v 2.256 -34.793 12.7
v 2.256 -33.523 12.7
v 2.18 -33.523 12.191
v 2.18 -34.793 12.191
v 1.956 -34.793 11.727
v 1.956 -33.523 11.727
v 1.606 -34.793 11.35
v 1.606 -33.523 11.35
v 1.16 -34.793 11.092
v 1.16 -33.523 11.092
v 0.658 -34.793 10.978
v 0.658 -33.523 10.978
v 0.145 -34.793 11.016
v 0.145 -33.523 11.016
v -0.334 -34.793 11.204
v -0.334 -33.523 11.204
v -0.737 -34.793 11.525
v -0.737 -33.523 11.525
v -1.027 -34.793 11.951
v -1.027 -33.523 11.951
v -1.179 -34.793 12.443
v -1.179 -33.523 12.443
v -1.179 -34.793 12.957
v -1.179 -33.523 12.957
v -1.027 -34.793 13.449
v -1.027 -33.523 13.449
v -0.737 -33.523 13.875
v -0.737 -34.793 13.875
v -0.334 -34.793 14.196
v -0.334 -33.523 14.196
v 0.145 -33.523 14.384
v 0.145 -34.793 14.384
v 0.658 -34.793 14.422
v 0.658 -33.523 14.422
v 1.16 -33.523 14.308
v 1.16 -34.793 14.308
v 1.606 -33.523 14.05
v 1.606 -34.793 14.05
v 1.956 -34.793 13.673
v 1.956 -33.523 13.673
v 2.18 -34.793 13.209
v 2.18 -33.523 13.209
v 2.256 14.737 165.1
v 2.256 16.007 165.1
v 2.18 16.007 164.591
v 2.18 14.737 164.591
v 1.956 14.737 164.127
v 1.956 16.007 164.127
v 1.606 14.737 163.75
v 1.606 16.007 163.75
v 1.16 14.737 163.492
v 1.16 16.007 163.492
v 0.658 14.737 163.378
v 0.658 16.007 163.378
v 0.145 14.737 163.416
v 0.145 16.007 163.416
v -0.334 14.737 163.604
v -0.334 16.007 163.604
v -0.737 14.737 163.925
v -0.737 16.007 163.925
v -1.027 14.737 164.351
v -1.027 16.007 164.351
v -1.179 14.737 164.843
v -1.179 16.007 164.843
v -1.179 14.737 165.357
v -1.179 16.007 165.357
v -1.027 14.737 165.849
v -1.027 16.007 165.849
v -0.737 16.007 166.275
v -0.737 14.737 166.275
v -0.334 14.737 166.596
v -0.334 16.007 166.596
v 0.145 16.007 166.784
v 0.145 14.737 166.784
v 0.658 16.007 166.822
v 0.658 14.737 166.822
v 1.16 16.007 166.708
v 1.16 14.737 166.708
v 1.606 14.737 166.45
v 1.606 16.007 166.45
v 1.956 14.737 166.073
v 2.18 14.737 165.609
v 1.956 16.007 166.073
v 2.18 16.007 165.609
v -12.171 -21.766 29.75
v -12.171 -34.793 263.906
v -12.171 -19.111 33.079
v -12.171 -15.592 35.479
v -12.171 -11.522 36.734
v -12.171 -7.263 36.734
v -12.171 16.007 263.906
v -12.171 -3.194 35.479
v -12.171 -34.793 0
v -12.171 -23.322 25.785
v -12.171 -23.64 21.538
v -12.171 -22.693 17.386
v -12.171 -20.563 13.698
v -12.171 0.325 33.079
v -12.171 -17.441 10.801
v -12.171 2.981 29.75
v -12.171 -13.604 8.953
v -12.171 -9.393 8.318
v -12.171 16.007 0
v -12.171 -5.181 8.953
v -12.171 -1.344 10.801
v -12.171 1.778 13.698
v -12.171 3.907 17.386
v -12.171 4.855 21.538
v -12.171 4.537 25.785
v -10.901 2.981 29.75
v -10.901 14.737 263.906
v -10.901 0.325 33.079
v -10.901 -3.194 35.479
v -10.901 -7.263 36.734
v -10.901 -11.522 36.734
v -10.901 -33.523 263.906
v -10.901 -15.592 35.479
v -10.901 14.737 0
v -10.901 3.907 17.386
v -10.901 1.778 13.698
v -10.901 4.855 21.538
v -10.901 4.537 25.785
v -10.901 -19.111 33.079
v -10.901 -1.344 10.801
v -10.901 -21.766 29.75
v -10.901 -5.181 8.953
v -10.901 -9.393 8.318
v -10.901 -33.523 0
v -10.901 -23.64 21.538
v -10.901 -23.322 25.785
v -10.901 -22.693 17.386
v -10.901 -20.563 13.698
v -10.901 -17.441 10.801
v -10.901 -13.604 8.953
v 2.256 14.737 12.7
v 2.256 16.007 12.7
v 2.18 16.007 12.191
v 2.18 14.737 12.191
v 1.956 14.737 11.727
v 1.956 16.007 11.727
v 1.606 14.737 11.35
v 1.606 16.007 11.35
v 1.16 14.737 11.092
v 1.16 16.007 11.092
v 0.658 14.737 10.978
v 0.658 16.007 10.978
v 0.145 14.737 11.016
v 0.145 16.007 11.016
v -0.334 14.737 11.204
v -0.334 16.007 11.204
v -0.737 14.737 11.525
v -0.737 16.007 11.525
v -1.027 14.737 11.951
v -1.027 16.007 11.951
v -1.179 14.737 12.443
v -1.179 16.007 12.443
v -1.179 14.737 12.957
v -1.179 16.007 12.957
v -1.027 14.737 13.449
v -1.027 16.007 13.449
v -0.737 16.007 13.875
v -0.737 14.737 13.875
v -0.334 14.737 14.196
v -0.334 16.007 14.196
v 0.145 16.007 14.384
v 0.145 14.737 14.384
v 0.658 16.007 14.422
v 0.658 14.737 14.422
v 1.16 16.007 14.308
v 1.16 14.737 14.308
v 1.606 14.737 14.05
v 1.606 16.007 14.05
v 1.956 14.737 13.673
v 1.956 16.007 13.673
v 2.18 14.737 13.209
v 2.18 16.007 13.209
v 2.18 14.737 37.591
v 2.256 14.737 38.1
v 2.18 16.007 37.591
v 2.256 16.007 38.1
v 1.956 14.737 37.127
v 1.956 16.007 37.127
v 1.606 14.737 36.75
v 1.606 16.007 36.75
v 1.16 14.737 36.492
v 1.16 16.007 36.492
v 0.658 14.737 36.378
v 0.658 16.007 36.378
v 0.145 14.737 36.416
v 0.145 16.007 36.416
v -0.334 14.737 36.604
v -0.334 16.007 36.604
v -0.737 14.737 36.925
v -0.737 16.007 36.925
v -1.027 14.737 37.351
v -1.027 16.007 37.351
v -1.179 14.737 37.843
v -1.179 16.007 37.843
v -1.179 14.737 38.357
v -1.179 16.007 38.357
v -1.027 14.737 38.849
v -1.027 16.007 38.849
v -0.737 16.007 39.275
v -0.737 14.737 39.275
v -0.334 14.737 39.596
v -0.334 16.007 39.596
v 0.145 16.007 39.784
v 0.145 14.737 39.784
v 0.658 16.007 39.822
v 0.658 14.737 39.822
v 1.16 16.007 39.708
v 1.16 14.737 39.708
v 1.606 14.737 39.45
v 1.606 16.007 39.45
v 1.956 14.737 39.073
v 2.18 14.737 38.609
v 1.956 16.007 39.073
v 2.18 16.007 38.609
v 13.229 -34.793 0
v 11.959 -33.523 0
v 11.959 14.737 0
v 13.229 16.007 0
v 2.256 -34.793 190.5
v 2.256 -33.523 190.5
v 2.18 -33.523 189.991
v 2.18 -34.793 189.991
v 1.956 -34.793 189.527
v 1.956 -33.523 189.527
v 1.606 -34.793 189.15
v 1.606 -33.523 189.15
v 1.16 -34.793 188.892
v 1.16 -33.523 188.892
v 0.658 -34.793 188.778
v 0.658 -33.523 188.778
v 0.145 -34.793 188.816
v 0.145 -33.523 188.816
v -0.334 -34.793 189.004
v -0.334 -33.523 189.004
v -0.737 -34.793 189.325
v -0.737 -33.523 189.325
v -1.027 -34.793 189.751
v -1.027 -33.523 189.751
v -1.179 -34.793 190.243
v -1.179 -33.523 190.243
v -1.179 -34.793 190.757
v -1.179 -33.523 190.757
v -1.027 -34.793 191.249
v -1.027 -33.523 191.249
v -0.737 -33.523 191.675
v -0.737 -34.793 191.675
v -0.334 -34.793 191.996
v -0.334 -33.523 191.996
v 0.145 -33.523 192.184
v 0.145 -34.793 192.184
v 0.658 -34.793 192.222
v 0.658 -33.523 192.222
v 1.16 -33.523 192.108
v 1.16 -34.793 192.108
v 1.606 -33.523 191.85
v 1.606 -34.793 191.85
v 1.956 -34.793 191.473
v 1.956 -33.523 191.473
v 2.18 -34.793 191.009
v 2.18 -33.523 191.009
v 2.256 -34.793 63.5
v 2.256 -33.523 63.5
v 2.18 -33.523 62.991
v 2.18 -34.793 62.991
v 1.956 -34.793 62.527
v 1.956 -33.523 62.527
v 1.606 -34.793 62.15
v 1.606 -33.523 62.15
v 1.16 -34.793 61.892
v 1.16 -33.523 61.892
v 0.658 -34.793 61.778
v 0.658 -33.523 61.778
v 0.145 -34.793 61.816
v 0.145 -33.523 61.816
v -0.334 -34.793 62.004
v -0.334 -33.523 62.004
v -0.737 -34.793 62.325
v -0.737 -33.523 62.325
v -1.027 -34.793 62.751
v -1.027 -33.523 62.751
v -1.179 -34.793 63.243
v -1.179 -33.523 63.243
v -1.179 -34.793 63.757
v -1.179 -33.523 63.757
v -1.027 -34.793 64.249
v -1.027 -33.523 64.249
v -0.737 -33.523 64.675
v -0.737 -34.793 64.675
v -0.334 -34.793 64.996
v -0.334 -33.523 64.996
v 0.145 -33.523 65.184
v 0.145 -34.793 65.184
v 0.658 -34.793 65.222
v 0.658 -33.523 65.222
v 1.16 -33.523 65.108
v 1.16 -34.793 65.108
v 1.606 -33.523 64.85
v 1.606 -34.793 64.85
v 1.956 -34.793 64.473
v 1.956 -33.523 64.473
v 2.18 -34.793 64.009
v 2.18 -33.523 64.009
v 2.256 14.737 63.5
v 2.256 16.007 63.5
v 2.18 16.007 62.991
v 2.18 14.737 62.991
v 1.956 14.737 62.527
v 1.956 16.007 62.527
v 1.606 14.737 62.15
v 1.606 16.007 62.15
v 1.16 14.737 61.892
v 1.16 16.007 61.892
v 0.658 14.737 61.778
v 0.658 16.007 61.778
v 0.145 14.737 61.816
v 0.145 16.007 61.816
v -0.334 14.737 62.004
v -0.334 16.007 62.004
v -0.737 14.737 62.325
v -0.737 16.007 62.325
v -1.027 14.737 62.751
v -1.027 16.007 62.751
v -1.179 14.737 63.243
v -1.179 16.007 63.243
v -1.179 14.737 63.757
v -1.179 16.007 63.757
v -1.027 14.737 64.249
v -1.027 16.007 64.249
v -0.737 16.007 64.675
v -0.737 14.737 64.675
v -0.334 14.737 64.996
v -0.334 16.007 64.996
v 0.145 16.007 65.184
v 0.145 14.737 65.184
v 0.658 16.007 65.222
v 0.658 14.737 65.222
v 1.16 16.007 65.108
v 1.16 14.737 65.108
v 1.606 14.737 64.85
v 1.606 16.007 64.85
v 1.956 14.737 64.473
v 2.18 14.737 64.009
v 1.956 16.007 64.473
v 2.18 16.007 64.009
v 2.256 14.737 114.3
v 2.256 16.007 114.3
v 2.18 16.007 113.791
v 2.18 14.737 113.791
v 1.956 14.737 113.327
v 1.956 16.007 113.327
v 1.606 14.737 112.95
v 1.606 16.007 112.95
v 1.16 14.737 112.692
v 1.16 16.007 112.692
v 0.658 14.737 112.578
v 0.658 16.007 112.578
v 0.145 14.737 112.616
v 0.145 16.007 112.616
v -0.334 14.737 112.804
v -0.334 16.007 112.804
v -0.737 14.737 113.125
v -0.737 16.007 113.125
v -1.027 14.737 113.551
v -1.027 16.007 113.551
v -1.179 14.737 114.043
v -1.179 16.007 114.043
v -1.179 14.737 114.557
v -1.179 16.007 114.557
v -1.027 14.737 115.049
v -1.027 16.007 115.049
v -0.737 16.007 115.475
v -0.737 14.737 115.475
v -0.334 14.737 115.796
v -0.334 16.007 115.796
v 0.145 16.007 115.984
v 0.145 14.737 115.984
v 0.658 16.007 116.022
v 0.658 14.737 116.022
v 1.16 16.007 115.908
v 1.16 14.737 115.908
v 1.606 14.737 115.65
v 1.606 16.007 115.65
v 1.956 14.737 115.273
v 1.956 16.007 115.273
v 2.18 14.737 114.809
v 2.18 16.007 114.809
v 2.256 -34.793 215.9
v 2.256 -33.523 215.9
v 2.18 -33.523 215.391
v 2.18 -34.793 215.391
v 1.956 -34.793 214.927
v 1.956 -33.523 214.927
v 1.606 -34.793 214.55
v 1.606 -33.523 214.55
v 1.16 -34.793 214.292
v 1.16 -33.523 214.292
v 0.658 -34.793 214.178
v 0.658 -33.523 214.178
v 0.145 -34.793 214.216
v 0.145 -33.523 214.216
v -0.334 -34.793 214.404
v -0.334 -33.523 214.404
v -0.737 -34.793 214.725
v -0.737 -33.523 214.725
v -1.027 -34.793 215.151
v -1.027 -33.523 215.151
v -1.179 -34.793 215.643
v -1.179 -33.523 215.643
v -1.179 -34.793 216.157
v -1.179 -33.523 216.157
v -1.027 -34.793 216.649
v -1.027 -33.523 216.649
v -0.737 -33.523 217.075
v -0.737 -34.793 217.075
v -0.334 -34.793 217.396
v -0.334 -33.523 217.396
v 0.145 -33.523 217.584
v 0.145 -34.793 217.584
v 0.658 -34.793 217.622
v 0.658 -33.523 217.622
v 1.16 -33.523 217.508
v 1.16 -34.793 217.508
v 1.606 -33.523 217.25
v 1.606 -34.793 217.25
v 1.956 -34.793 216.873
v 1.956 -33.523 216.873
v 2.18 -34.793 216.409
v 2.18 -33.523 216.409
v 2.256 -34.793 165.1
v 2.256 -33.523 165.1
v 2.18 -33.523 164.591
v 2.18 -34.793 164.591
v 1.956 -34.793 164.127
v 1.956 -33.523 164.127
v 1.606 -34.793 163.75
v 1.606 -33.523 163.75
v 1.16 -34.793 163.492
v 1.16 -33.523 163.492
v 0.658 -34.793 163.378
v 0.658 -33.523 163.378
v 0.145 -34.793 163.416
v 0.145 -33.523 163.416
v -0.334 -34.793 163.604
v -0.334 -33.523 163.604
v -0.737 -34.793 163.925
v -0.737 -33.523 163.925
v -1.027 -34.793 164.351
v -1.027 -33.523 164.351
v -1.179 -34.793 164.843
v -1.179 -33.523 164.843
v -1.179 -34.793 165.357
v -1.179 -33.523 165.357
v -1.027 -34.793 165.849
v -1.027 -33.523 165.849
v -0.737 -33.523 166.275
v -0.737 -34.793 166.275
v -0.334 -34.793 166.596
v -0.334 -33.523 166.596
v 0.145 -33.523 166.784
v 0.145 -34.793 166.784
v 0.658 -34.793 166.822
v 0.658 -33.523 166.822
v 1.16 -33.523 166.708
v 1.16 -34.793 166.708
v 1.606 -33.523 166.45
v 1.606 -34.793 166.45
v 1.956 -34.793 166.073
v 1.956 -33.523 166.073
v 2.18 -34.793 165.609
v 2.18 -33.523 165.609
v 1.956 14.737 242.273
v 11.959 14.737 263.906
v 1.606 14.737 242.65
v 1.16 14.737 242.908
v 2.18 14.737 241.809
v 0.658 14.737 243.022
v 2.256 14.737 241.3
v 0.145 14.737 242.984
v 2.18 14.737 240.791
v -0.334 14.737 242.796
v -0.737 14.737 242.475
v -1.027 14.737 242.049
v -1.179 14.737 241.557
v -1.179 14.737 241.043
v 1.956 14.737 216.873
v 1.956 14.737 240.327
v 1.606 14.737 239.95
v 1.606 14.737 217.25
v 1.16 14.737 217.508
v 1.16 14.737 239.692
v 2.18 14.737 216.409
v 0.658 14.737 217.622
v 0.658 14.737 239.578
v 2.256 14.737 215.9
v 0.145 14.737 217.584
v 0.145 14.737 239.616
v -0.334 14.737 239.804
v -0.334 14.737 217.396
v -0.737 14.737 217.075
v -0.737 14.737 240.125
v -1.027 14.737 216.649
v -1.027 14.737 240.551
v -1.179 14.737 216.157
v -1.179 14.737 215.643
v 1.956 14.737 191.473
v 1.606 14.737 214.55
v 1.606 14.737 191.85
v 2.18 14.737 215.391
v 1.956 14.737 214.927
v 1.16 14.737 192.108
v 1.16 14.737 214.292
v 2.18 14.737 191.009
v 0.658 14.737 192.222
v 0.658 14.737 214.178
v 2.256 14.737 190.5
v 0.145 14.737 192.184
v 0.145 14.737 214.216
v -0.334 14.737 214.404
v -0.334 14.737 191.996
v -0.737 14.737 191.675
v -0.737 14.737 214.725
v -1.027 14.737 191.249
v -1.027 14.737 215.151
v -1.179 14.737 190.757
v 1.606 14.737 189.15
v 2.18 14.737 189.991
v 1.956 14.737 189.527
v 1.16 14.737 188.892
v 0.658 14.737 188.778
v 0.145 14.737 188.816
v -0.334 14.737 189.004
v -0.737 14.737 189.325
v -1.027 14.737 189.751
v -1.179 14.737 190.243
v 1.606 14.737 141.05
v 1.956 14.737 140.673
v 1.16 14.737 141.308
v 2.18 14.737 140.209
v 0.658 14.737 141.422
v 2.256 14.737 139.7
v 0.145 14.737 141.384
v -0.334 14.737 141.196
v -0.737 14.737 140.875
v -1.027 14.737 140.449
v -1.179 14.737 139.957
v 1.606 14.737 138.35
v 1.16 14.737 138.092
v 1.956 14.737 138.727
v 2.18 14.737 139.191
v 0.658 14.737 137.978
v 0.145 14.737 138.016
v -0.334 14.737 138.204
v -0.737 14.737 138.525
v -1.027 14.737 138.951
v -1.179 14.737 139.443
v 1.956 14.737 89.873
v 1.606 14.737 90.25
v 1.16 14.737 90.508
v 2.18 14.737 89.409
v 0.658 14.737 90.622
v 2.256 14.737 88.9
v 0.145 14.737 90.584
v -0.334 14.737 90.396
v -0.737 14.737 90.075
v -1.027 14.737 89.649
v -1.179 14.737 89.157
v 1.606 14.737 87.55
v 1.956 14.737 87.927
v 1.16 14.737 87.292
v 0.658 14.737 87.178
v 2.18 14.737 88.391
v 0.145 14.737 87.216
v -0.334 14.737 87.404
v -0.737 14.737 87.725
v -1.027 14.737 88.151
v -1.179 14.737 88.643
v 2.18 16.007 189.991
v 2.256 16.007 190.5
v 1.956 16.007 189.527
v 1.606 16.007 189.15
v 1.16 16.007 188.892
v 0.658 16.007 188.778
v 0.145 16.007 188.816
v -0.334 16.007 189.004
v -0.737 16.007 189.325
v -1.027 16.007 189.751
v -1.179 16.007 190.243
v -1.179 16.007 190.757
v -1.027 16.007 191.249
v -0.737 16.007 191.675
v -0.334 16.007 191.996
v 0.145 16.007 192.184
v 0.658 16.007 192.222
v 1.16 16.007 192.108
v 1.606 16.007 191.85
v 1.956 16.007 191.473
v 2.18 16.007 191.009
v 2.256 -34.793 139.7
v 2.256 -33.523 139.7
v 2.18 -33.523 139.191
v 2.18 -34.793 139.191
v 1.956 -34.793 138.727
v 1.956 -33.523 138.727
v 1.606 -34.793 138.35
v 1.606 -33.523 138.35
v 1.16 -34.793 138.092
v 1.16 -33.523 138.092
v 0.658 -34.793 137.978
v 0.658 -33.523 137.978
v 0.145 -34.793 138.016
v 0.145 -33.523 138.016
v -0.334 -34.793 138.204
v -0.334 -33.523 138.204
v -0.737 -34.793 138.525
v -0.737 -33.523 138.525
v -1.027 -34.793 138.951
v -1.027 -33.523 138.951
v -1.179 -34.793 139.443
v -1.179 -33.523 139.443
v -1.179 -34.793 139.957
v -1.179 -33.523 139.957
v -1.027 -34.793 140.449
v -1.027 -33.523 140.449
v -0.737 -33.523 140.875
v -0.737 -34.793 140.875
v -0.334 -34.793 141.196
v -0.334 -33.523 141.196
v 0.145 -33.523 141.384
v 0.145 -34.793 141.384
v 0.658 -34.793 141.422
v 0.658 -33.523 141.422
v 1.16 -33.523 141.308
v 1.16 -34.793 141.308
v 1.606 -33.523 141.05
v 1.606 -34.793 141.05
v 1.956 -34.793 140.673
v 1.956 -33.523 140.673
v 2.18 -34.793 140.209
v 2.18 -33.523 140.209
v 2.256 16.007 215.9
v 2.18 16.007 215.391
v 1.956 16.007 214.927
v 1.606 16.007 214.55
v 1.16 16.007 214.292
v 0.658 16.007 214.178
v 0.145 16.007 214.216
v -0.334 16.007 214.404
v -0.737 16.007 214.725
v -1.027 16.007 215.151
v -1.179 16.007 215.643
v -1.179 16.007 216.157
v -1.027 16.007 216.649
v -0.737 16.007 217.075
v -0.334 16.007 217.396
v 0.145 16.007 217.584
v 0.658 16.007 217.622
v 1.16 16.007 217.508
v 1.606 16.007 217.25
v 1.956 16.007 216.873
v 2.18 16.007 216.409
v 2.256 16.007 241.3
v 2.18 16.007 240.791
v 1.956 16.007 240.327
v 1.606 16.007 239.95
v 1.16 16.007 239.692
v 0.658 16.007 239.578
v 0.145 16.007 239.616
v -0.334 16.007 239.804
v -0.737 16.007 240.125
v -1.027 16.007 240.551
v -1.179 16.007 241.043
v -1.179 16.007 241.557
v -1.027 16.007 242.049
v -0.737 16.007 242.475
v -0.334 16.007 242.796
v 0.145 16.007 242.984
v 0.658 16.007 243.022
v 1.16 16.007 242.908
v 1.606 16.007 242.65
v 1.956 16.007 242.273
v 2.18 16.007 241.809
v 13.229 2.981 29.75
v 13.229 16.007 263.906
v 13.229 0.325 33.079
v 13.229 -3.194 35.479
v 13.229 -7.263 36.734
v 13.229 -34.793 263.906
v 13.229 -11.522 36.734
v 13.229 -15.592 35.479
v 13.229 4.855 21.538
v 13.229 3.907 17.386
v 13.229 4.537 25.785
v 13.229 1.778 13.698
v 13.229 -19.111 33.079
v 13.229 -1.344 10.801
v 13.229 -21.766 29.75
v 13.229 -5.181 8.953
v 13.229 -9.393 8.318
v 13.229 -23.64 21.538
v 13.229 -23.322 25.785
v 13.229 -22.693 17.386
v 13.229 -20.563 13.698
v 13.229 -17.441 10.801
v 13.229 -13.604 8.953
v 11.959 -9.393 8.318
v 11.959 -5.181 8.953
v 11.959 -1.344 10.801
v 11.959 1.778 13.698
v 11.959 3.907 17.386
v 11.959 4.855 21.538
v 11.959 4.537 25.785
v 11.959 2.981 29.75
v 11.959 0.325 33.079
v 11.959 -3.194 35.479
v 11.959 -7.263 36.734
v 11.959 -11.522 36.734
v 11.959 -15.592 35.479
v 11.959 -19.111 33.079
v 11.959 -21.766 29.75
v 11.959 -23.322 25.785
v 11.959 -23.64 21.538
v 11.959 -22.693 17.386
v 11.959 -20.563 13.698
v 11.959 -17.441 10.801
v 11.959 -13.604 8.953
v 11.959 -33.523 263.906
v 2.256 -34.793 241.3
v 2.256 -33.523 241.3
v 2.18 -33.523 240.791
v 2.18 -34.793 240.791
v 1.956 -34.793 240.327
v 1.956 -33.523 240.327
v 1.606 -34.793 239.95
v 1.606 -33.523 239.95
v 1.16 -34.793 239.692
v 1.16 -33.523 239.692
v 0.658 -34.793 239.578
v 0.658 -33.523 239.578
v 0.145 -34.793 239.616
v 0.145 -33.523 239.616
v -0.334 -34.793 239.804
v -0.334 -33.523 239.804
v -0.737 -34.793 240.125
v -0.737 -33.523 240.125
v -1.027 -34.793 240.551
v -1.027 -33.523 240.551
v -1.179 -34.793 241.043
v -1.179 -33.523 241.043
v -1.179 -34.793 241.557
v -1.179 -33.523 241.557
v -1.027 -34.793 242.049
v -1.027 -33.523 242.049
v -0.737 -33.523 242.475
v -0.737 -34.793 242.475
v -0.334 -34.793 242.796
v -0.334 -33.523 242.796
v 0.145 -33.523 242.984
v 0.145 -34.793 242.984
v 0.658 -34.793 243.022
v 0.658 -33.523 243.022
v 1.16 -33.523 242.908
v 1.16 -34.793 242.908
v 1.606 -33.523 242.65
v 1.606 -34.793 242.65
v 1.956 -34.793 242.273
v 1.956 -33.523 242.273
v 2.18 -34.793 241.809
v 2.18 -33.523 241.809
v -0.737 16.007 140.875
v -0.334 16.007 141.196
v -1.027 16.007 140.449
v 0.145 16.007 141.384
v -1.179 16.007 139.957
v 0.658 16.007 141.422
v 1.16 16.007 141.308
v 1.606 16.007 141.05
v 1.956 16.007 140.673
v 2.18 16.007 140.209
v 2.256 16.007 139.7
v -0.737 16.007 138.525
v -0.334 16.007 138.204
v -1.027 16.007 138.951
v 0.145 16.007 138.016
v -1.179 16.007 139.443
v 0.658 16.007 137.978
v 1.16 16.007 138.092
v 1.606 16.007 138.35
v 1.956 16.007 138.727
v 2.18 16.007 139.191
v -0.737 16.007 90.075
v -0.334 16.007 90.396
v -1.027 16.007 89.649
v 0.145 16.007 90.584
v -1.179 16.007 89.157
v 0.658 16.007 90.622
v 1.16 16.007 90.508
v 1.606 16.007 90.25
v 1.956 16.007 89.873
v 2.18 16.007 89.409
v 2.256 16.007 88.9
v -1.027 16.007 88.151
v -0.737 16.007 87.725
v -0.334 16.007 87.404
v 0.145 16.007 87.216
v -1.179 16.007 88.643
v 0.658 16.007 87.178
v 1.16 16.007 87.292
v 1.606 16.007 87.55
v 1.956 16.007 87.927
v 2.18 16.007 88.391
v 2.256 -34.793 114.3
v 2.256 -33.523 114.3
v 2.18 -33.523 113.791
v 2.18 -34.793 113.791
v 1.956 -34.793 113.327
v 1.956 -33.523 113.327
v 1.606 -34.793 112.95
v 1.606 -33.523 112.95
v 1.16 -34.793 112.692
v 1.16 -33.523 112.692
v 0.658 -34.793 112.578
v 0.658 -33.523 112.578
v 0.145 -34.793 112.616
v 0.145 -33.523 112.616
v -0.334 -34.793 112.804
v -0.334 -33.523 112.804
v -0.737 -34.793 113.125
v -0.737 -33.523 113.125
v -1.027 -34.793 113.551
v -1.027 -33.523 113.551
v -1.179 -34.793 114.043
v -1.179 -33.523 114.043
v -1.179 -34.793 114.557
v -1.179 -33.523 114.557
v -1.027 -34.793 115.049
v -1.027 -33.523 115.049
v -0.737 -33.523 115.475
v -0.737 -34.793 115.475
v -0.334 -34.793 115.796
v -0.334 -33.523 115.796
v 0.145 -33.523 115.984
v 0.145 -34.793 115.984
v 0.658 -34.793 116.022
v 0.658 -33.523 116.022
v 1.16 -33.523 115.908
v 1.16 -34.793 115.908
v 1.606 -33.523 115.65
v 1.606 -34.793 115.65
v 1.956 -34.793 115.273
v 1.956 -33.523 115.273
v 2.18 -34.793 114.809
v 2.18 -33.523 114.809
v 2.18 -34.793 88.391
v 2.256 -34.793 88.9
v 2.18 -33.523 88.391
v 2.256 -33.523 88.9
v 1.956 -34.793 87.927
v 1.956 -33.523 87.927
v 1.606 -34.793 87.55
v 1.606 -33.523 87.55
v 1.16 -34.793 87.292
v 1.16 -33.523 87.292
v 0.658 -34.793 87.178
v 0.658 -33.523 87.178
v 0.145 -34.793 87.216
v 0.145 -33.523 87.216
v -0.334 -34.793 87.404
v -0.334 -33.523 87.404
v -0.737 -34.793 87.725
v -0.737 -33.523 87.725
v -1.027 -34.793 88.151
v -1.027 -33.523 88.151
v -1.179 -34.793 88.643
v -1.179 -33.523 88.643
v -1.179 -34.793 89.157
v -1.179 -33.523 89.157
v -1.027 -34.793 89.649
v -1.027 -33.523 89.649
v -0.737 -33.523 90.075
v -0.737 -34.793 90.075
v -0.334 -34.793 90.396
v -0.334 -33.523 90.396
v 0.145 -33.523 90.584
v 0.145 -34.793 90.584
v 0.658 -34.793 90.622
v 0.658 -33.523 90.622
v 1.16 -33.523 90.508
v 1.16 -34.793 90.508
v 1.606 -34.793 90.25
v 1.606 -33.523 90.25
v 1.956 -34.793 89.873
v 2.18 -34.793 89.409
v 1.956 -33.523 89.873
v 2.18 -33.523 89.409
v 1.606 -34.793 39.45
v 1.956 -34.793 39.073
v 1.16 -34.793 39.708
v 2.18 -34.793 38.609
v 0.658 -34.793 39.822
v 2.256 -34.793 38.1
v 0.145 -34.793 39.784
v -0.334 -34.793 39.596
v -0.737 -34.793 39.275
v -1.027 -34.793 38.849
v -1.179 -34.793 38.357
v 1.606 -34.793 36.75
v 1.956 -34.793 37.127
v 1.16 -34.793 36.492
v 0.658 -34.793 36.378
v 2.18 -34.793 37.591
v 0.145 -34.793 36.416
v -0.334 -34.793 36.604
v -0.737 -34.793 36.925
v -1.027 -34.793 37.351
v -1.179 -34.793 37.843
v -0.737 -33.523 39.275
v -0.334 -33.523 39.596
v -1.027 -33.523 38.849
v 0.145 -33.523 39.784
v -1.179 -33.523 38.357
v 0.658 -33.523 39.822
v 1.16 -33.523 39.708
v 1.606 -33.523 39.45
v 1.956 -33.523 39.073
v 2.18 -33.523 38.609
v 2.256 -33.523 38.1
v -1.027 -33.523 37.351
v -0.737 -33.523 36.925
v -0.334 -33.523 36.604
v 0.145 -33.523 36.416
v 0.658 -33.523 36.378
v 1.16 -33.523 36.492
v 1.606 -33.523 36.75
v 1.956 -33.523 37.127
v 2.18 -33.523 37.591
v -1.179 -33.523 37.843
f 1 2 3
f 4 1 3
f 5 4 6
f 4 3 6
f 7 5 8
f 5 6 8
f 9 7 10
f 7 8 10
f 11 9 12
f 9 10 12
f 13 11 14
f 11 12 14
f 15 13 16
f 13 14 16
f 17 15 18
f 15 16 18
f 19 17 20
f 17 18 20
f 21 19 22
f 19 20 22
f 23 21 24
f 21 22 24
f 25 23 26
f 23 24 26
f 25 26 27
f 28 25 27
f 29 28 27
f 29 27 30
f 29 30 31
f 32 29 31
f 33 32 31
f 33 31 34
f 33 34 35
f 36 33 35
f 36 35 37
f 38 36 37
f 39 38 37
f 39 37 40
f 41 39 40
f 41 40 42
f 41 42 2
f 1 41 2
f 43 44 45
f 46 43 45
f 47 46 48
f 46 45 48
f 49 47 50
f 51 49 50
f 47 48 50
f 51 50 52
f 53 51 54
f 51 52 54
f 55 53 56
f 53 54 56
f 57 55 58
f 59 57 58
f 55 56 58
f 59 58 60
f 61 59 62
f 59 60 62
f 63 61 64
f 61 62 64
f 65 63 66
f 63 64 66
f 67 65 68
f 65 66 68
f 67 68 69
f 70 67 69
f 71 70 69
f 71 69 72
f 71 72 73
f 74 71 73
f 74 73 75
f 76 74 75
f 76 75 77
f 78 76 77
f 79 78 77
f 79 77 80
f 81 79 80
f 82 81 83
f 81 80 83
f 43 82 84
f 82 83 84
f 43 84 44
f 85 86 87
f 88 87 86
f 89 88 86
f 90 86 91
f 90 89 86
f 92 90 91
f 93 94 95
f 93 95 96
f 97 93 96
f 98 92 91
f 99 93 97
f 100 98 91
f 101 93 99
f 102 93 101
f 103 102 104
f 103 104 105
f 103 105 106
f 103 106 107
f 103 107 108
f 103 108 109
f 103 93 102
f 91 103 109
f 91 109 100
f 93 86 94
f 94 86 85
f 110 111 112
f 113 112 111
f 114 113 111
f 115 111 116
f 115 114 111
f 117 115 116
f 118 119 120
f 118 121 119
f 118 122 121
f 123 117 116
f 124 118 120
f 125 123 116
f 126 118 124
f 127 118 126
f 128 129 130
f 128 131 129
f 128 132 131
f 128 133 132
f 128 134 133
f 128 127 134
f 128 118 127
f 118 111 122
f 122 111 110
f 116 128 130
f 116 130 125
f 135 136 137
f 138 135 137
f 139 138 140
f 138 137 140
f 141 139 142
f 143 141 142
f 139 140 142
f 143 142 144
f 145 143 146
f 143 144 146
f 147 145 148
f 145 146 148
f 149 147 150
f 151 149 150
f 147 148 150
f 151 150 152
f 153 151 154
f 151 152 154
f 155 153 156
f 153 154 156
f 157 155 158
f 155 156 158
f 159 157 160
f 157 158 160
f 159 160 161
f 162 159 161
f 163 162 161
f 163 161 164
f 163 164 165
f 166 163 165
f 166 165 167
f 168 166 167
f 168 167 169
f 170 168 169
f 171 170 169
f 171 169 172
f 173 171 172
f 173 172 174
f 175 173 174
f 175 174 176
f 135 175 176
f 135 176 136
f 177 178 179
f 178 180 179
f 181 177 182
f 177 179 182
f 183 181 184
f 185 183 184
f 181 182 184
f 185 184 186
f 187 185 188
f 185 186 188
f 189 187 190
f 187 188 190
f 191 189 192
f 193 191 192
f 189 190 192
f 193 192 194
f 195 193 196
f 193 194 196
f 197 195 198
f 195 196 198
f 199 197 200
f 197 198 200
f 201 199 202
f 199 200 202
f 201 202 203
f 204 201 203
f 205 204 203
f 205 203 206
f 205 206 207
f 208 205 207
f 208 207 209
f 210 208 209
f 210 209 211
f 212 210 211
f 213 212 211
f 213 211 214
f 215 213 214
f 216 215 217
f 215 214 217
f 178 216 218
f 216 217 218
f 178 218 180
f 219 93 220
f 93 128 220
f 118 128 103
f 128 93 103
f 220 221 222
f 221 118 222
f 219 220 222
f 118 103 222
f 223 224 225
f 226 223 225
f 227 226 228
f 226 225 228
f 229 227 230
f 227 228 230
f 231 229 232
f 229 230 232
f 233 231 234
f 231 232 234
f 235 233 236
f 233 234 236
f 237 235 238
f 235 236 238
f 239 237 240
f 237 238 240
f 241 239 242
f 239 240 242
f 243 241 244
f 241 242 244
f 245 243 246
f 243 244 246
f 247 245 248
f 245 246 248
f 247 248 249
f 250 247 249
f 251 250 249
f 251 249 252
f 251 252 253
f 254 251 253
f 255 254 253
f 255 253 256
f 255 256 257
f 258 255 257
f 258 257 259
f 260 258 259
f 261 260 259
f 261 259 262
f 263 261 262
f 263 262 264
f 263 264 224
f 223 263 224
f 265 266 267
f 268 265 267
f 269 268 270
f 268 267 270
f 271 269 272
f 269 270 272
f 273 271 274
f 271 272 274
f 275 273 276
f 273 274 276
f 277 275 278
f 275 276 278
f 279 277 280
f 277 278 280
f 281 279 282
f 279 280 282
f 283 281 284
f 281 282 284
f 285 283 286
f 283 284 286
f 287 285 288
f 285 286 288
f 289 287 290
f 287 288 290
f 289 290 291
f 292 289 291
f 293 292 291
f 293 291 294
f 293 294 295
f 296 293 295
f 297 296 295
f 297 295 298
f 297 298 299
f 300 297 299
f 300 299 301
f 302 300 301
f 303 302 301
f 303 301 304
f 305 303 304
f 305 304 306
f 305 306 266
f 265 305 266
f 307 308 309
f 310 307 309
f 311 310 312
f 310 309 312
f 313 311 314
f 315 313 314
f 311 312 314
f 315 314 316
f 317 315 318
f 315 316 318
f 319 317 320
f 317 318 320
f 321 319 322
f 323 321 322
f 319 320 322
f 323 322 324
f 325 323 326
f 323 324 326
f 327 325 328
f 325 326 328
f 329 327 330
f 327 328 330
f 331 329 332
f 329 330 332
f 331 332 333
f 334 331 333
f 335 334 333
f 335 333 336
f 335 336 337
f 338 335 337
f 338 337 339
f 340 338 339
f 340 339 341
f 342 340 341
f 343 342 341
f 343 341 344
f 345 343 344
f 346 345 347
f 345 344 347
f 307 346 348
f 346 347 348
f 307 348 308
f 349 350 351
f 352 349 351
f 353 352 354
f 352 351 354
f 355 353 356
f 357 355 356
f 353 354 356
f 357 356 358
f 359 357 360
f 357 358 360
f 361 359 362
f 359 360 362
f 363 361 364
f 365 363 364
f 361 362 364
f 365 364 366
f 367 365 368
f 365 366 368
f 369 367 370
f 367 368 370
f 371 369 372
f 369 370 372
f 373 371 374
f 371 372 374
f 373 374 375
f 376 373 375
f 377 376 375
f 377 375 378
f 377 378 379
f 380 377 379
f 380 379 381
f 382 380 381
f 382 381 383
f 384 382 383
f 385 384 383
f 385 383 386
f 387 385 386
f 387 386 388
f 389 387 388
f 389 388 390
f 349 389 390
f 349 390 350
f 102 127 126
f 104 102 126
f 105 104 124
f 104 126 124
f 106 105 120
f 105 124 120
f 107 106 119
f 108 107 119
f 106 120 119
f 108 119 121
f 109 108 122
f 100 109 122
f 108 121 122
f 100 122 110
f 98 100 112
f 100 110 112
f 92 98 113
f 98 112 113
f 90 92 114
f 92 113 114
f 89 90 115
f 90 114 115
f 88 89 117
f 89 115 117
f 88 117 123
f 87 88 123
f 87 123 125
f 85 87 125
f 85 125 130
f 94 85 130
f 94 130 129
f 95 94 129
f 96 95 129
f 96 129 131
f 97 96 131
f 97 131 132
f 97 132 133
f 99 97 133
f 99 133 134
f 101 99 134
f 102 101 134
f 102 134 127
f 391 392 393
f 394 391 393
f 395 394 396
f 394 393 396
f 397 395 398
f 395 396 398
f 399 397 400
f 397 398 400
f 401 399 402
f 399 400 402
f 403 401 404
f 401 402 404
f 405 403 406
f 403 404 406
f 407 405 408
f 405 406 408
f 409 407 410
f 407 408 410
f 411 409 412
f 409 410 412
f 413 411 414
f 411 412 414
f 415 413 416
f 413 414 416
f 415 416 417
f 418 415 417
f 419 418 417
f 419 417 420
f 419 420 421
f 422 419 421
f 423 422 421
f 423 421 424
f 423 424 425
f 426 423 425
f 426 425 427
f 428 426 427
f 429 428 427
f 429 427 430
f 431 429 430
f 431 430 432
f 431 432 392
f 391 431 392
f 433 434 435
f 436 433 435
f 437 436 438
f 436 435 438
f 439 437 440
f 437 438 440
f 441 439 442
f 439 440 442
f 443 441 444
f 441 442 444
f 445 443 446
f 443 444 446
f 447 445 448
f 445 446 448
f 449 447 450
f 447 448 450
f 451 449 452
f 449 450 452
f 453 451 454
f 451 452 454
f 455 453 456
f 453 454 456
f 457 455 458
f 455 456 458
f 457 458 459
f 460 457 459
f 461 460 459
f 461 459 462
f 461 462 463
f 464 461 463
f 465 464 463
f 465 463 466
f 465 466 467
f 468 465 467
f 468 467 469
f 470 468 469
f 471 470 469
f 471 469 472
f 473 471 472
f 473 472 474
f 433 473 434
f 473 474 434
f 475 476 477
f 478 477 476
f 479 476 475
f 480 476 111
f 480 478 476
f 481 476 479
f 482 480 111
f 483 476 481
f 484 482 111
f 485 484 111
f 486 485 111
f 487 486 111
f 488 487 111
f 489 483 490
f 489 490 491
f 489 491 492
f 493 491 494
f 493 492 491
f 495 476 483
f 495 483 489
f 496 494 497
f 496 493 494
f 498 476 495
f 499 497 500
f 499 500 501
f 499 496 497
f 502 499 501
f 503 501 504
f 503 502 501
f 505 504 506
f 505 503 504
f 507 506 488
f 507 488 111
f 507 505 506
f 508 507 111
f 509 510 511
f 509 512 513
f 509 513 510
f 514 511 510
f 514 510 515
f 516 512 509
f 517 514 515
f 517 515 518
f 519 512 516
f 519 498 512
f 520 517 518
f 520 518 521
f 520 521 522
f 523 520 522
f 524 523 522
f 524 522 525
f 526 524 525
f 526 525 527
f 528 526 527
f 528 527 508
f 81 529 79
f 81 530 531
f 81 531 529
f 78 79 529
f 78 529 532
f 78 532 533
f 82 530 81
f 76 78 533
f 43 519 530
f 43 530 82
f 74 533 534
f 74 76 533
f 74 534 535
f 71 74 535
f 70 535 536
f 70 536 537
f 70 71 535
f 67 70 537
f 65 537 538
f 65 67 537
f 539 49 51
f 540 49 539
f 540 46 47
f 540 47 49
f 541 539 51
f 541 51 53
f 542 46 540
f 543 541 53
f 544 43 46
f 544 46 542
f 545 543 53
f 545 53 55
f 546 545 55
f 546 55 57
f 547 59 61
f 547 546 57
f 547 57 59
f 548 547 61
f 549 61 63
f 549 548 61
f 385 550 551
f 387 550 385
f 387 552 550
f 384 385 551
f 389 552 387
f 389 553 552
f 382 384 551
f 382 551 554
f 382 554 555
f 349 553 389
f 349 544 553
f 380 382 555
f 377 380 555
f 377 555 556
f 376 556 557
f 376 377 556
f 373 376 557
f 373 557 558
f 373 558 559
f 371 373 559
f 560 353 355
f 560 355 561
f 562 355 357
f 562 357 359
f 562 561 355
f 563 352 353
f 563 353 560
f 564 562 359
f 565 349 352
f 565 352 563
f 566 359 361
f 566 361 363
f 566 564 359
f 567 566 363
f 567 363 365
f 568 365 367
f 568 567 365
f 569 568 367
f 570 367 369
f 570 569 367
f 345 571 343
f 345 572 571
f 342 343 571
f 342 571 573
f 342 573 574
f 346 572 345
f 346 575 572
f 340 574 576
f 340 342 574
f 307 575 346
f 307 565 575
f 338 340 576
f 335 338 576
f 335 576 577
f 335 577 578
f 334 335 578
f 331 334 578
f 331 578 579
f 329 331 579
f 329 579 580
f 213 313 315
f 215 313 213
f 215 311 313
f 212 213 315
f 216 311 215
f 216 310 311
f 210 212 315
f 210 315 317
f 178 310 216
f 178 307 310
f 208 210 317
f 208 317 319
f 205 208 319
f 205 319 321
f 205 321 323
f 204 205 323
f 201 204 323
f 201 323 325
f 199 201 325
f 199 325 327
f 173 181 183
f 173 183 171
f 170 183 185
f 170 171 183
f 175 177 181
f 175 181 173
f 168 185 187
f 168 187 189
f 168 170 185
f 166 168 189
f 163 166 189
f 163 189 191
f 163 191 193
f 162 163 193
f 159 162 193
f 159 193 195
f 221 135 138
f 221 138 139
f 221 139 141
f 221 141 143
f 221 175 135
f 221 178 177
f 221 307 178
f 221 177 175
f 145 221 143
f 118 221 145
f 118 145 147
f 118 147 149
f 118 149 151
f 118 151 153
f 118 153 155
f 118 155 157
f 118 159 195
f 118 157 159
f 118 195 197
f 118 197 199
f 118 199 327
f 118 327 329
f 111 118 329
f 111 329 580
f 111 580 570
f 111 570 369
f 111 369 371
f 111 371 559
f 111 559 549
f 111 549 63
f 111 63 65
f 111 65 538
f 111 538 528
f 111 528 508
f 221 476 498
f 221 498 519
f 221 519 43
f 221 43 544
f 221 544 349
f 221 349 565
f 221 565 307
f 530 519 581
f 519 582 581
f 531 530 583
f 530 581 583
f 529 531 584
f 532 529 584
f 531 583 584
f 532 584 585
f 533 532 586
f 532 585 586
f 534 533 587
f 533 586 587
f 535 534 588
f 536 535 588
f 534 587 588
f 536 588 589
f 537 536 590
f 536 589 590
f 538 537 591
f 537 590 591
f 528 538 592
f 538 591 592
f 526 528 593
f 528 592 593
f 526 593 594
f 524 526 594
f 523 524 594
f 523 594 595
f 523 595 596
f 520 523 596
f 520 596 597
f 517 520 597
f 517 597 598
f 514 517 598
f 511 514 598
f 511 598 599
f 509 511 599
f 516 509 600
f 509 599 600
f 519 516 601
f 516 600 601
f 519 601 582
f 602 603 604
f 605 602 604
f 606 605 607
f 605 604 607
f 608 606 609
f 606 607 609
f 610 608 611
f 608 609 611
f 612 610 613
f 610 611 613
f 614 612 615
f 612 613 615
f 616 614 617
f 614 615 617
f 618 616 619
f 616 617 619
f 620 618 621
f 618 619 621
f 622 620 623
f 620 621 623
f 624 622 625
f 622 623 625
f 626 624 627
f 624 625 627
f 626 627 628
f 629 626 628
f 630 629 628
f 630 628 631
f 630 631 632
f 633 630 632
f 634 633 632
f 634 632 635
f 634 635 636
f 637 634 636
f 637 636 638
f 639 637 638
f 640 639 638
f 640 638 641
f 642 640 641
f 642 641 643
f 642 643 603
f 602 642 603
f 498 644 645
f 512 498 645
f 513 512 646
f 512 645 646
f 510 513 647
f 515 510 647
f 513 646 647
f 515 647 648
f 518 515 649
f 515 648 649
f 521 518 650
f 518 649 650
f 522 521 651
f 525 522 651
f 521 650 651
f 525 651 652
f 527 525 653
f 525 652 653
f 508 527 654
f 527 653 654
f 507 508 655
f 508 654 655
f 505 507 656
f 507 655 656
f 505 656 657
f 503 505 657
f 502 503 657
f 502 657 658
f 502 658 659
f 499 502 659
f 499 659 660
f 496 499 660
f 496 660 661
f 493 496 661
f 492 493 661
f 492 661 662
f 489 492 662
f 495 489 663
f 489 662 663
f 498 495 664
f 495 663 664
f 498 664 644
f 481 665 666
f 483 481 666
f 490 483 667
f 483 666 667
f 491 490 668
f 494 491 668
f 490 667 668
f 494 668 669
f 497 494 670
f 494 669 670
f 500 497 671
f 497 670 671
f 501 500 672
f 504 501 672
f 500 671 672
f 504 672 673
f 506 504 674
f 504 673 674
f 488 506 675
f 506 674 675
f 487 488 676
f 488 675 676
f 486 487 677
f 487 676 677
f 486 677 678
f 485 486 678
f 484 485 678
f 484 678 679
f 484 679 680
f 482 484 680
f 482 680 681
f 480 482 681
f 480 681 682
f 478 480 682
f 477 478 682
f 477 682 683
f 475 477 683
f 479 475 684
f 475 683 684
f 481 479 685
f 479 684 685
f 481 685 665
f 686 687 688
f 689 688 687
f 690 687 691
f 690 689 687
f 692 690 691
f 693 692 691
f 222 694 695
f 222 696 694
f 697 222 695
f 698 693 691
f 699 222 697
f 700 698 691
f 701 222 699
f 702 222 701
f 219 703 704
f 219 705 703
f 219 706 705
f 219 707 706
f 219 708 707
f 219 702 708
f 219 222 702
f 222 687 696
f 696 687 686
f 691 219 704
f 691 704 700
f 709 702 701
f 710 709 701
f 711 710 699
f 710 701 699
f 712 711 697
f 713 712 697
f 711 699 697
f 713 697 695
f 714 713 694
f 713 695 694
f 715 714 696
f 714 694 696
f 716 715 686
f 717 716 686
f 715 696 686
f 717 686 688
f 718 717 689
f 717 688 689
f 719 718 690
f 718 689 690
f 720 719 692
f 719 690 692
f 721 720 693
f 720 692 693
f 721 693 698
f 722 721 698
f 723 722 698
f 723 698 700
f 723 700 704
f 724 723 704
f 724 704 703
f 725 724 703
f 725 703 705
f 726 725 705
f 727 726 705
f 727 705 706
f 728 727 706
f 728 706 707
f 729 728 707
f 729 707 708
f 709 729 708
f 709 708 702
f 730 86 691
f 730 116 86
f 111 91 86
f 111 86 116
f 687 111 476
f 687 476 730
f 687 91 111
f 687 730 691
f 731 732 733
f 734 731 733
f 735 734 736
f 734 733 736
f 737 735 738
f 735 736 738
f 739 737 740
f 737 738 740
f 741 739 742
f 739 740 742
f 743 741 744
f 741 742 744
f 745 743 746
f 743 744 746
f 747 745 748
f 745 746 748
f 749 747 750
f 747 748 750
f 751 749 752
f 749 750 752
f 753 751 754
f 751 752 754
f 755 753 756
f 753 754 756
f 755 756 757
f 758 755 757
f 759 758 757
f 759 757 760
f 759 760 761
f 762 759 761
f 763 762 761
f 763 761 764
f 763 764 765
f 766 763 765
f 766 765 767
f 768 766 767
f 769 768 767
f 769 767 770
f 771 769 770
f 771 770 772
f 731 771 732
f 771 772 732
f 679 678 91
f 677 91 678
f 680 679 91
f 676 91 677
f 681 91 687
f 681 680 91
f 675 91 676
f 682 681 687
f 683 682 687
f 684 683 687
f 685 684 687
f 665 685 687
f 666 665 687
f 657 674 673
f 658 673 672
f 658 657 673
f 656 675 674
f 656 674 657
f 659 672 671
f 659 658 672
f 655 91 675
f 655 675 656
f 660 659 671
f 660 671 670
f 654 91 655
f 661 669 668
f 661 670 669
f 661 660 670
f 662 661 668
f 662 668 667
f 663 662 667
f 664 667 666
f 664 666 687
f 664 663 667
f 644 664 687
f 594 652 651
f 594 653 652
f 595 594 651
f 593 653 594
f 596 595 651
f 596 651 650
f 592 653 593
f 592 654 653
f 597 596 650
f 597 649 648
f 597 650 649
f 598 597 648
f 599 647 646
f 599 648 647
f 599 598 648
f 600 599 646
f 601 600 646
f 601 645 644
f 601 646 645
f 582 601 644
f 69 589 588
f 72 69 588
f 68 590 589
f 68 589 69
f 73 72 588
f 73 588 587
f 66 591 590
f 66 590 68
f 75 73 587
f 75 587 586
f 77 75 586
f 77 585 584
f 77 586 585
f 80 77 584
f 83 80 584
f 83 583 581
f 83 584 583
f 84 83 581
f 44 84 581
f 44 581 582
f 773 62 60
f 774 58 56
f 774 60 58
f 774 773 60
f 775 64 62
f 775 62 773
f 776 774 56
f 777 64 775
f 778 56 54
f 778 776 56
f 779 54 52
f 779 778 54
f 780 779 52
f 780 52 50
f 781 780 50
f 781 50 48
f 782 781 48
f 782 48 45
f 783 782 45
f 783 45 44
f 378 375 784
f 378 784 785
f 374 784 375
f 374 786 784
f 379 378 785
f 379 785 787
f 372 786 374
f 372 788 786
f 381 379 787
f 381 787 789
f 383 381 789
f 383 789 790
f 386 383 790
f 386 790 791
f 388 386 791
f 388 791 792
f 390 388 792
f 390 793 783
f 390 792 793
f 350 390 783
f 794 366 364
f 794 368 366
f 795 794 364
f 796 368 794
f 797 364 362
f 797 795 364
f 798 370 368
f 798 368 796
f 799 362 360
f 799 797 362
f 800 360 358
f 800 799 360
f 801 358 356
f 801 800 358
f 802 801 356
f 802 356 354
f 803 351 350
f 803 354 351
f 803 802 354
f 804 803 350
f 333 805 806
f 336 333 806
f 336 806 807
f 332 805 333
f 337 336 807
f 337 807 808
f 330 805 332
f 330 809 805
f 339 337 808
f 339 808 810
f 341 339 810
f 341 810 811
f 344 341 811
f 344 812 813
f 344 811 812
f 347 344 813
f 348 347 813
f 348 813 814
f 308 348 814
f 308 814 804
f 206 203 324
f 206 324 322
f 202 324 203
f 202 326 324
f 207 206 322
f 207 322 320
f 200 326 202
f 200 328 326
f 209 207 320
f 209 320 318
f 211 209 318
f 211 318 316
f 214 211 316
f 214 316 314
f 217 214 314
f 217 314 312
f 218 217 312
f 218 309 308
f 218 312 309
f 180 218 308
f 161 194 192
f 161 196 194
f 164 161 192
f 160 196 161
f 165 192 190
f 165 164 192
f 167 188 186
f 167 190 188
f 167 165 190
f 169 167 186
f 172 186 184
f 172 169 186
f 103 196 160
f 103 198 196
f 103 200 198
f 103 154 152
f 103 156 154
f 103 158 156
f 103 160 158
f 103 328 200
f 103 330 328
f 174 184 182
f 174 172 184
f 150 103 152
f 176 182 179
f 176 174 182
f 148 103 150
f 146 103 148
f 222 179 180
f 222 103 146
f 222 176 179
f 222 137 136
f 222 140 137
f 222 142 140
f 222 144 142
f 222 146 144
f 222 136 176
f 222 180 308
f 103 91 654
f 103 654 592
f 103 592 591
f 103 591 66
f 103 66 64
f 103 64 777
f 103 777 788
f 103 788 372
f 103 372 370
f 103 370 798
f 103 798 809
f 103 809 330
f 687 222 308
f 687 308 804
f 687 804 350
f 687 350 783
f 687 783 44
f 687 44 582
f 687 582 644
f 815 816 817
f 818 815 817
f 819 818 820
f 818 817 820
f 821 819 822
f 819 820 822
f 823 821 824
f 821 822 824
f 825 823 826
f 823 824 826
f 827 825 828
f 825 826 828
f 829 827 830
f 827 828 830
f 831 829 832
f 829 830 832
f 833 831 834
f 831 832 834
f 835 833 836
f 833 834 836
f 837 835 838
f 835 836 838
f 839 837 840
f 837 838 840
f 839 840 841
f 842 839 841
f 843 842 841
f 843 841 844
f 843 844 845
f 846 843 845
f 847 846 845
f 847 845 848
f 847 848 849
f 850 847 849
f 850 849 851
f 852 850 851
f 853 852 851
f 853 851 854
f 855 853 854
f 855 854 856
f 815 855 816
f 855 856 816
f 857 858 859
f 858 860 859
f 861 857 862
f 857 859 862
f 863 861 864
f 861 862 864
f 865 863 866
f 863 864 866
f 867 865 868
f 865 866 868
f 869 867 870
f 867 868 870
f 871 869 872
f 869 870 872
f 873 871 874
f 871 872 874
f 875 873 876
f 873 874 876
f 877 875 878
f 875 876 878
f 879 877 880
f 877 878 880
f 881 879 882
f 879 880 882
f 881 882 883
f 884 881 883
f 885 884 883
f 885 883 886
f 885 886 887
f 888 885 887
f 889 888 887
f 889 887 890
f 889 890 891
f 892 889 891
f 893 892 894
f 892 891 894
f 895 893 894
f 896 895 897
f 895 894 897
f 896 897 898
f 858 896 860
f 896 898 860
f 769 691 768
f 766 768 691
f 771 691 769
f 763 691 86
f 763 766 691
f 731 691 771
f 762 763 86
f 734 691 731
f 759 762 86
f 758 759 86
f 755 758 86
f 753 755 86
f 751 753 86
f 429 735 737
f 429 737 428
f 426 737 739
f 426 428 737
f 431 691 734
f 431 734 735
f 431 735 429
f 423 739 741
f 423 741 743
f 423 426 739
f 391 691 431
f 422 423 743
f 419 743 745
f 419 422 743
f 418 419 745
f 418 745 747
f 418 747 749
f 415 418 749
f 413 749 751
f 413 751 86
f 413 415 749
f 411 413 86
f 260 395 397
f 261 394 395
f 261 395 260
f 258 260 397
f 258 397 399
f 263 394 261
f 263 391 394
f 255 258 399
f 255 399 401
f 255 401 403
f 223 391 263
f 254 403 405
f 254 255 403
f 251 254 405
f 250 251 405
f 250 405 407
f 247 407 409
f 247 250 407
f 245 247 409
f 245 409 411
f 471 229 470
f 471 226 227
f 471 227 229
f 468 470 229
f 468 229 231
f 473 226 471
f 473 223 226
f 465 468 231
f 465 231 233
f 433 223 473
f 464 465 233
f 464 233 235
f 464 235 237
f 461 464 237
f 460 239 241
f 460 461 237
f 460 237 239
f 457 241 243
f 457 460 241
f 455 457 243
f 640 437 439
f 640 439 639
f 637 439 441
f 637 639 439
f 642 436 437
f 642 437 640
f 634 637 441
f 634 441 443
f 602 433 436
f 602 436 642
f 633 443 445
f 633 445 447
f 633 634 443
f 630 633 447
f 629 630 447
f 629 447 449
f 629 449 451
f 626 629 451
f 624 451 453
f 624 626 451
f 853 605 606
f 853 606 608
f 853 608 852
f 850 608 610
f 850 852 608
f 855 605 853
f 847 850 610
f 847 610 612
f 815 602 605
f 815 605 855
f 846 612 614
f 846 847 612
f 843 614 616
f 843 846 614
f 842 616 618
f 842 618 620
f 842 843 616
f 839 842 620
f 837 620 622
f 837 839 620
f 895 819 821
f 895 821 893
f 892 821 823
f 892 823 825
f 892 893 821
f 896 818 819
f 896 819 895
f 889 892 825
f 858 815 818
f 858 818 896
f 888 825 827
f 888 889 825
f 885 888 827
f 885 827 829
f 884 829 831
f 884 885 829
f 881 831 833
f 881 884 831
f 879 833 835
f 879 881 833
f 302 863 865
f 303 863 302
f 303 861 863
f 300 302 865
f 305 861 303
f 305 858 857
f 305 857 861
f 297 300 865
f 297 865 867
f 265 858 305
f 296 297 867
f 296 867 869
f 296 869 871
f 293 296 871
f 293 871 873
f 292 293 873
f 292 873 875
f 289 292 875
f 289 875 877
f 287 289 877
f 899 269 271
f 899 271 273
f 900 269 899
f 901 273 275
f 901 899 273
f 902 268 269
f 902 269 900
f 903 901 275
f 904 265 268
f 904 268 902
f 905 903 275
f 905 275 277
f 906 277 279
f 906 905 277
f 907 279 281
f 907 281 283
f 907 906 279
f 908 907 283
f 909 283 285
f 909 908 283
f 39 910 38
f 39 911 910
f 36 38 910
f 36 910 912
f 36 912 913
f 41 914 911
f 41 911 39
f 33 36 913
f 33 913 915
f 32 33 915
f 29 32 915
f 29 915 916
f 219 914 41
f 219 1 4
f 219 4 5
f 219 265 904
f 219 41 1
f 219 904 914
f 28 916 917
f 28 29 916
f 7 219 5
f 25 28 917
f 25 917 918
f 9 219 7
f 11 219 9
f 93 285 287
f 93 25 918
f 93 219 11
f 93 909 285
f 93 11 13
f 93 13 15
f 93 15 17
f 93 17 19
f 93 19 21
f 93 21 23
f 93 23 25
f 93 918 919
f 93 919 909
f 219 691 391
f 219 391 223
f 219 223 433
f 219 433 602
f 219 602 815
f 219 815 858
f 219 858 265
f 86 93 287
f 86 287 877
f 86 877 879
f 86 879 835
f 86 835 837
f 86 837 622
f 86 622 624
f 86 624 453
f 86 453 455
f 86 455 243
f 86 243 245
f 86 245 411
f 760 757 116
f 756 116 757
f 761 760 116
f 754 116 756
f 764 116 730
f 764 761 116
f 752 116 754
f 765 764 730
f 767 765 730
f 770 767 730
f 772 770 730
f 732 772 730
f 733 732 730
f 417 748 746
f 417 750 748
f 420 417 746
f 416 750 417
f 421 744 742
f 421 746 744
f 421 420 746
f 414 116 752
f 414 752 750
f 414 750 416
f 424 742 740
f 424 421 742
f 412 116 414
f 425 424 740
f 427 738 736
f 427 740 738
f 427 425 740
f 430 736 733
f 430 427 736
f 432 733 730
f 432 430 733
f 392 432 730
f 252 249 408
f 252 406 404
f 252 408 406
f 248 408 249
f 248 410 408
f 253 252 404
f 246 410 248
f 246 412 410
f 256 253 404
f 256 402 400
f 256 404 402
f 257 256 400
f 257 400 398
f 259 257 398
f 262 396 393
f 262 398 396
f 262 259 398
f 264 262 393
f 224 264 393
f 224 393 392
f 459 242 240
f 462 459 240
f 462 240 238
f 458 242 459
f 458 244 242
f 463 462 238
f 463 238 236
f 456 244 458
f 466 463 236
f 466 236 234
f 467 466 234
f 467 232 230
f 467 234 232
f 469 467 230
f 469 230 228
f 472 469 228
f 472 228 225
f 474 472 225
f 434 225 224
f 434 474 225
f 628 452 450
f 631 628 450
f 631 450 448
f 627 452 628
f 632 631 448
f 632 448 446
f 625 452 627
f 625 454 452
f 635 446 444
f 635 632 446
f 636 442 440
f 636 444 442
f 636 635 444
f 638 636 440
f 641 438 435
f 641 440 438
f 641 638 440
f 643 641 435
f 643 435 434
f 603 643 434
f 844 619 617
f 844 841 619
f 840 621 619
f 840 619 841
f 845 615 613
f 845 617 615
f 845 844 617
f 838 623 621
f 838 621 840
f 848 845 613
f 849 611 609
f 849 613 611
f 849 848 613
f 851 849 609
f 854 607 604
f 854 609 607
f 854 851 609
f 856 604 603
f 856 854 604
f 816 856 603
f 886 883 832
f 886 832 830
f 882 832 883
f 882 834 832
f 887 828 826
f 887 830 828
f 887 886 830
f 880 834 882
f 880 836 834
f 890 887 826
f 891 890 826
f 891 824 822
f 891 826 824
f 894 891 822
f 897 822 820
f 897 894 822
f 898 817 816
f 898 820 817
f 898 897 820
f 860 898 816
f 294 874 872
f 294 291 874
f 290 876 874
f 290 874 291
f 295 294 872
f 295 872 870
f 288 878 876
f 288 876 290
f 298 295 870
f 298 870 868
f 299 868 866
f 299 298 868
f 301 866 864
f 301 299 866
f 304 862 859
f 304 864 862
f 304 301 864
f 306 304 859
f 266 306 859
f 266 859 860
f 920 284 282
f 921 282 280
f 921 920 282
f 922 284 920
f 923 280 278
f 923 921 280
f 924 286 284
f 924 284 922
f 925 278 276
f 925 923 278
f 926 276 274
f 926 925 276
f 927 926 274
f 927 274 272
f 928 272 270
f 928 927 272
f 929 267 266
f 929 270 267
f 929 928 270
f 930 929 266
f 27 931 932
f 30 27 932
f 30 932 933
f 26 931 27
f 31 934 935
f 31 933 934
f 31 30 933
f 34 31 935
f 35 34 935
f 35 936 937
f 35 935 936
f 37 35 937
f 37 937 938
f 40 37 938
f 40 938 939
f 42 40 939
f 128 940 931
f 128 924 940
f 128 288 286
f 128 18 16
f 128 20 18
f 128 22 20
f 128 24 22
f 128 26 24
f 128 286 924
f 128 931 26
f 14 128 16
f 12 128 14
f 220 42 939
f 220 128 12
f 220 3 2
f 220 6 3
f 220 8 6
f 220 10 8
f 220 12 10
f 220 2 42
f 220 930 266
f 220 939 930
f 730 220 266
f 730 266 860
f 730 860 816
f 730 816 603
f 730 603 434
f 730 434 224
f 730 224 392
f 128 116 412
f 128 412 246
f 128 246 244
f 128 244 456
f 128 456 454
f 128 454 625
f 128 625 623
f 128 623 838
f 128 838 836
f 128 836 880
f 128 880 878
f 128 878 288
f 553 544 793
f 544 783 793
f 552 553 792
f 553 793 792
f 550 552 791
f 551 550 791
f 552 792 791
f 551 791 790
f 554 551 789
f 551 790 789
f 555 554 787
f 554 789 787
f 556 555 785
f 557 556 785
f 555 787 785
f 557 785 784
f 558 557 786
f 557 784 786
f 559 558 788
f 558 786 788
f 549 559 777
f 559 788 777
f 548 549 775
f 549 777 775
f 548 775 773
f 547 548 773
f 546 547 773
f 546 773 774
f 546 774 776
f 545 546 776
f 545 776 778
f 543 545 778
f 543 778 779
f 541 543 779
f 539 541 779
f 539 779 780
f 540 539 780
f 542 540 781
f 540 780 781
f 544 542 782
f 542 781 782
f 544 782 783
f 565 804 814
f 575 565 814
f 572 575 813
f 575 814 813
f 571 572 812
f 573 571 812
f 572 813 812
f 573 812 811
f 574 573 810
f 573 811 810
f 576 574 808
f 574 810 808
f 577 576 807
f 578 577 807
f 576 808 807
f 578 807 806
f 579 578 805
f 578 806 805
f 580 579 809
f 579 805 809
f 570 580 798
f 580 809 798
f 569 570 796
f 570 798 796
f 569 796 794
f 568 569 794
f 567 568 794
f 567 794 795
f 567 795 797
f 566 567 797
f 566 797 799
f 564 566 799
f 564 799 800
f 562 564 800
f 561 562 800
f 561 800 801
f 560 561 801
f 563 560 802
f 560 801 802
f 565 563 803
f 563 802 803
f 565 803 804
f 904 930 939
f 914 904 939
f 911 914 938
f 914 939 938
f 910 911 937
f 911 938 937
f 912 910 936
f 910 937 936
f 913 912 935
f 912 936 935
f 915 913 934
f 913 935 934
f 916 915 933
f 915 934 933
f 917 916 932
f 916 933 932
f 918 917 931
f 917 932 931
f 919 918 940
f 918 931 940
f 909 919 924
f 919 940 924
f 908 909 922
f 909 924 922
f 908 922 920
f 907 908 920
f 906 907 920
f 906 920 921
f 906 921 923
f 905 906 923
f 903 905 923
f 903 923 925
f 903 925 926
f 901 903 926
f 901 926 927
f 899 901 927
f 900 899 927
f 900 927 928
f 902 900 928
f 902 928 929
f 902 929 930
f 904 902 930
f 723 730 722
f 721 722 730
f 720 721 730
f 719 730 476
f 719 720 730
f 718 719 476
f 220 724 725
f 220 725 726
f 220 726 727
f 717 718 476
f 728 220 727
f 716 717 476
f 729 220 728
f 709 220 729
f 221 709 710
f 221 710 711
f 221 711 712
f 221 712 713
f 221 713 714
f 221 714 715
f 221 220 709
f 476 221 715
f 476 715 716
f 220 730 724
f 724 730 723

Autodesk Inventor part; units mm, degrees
ref_plane "YZ Plane" through (0, 0, 0) normal (1, 0, 0) x (0, 1, 0)
ref_plane "XZ Plane" through (0, 0, 0) normal (0, 1, 0) x (-1, 0, 0)
ref_plane "XY Plane" through (0, 0, 0) normal (0, 0, 1) x (1, 0, 0)
sketch "Sketch1" plane through (0, 0, 0) normal (0, 0, 1) x (1, 0, 0)
  line L0 (-12.1708, 16.0073) -> (13.2292, 16.0073)
  line L1 (13.2292, 16.0073) -> (13.2292, -34.7927)
  line L2 (13.2292, -34.7927) -> (-12.1708, -34.7927)
  line L3 (-12.1708, -34.7927) -> (-12.1708, 16.0073)
  line L4 (11.9592, 14.7373) -> (-10.9008, 14.7373)
  line L5 (-10.9008, 14.7373) -> (-10.9008, -33.5227)
  line L6 (-10.9008, -33.5227) -> (11.9592, -33.5227)
  line L7 (11.9592, -33.5227) -> (11.9592, 14.7373)
  point P0 (0, 0)
  dimension "d0" = 25.4
  dimension "d1" = 50.8
  dimension "d2" = 1.27
extrude "Extrusion1" add sketch "Sketch1" along normal blind 263.906
sketch "Sketch2" plane through (-12.1708, 16.0073, 0) normal (0, 1, 0) x (1, 0, 0)
  circle A0 centre (12.7, -12.7) radius 1.7272
  line L0 (25.4, 0) -> (0, 0) projected
  line L1 (0, 0) -> (0, -263.906) projected
  point P0 (12.1708, 0)
  dimension "d5" = 3.4544
  dimension "d6" = 12.7
  dimension "d7" = 12.7
extrude "Extrusion2" cut sketch "Sketch2" against normal through all
pattern_linear "Rectangular Pattern1" count 26 spacing 25.4 along (0, 0, 1) of "Extrusion2"
sketch "Sketch3" plane through (13.2292, -34.7927, 0) normal (1, 0, 0) x (0, 0, -1)
  circle A0 centre (-22.606, 25.4) radius 14.2875
  line L0 (0, 0) -> (0, 50.8) projected
  line L1 (-263.906, 0) -> (-263.906, 50.8) projected
  point P0 (0, 34.7927)
  dimension "d15" = 28.575
  dimension "d16" = 22.606
extrude "Extrusion3" cut sketch "Sketch3" against normal through all
equation "\"d3\" = d13"
equation "\"d10\" = d14"
equation "\"d13\" = 263.906"
equation "\"d14\" = d13"
properties part number "VersaFrame 30in"
